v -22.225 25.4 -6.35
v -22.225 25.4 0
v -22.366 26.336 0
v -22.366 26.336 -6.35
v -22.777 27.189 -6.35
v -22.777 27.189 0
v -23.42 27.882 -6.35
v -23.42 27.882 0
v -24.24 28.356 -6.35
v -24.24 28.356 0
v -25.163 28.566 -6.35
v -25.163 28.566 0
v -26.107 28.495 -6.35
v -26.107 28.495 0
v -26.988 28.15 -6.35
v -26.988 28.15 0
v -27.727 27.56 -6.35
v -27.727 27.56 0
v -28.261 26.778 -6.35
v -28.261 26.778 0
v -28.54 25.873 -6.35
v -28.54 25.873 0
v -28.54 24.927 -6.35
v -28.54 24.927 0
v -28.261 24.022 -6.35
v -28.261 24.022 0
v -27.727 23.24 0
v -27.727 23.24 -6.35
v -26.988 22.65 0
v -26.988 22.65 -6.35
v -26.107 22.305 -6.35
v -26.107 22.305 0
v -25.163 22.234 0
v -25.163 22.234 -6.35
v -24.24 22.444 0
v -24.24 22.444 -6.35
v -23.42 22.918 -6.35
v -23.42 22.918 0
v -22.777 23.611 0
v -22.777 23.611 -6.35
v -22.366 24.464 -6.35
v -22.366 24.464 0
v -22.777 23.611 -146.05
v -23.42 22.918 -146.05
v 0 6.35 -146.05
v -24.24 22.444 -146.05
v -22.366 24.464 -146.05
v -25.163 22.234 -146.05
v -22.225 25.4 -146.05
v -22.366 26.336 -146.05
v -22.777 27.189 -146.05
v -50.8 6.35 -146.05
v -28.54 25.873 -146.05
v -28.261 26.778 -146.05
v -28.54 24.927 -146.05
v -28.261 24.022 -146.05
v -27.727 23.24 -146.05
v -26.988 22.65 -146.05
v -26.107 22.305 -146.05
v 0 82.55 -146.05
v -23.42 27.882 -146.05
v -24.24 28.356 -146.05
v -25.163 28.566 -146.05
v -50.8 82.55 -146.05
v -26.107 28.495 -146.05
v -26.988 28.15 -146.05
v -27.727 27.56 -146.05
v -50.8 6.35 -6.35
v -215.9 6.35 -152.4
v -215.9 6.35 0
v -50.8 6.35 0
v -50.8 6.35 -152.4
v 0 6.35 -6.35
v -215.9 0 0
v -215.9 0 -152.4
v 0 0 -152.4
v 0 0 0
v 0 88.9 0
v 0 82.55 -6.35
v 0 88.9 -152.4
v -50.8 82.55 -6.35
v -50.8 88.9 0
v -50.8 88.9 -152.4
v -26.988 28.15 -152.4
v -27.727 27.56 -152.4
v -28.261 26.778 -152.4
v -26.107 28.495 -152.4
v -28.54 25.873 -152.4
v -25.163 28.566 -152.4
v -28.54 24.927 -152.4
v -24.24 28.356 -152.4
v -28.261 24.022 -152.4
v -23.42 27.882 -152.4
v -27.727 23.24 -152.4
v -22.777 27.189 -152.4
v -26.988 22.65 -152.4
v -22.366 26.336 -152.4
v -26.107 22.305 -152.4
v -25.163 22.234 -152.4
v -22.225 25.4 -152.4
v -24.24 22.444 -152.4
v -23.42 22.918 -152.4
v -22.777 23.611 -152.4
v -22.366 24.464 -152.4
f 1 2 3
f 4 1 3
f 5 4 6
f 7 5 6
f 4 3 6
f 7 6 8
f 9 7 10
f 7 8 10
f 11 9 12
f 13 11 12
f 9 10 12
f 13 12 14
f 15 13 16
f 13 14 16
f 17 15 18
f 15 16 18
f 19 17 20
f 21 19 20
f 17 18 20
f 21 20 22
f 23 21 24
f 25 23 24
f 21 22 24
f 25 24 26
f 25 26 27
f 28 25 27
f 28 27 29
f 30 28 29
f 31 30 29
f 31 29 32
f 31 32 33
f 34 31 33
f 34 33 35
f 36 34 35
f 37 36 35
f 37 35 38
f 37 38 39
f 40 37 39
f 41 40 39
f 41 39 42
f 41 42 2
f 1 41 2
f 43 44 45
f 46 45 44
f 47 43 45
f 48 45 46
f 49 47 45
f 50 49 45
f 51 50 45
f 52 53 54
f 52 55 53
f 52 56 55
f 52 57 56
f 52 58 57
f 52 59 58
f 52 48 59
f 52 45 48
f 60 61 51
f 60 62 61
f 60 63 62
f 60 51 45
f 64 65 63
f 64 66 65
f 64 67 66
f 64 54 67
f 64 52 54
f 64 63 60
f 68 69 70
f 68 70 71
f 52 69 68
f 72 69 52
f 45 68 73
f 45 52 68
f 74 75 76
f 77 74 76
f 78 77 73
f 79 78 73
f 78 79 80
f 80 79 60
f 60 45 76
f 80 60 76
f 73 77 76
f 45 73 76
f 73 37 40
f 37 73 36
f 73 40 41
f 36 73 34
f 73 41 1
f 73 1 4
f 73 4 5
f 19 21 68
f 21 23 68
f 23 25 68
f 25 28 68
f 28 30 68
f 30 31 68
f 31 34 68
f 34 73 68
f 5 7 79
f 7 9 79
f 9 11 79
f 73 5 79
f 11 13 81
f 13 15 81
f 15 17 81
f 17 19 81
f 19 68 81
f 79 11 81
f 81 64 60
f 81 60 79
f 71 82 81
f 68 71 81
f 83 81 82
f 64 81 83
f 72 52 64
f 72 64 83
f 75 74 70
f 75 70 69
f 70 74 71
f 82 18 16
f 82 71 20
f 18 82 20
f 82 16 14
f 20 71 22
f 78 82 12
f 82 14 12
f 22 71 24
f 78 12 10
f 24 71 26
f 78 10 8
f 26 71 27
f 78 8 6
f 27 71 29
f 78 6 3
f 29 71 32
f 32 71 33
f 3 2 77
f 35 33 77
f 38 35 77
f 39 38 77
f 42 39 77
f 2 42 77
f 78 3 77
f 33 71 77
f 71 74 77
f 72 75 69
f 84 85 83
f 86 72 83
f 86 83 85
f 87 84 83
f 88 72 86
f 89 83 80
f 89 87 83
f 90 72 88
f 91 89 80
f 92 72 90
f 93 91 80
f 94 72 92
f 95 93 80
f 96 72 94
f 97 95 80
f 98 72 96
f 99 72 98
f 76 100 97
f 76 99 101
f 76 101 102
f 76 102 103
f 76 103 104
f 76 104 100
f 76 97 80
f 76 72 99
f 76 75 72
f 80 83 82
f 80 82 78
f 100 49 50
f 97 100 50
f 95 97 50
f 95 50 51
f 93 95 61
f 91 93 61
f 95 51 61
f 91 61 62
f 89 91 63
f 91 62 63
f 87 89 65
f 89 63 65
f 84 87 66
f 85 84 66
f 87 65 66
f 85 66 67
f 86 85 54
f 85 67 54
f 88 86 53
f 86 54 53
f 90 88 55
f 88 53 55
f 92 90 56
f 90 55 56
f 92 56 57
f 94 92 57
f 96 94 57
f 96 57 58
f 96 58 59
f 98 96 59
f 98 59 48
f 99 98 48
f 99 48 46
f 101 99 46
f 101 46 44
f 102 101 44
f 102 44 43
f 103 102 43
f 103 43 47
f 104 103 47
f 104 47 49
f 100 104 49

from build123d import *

# Parameters (mm, degrees)
SKETCH1_W                   = 165.1
SKETCH1_H                   = 152.4
BOSS_EXTRUDE1_DEPTH         = 6.35
SKETCH1_7_W                 = 50.8
SKETCH1_7_H                 = 152.4
BOSS_EXTRUDE2_DEPTH         = 88.9
SKETCH29_W                  = 139.7
SKETCH29_H                  = 76.2
CUT_EXTRUDE4_DEPTH          = 242.633979399
F_1_4_0_25_DIAMETER_HOLE2_D = 6.35


with BuildPart() as part:
    # Sketch1 → Boss-Extrude1 (new body)
    with BuildSketch(Plane(origin=(0, 0, 0), x_dir=(1, 0, 0), z_dir=(0, 1, 0))):
        with Locations((-133.35, 76.2)):
            Rectangle(SKETCH1_W, SKETCH1_H)
    extrude(amount=BOSS_EXTRUDE1_DEPTH)

    # Sketch1<7> → Boss-Extrude2 (add)
    with BuildSketch(Plane(origin=(0, 0, 0), x_dir=(1, 0, 0), z_dir=(0, 1, 0))):
        with Locations((-25.4, 76.2)):
            Rectangle(SKETCH1_7_W, SKETCH1_7_H)
    extrude(amount=BOSS_EXTRUDE2_DEPTH)

    # Sketch29 → Cut-Extrude4 (cut, through all)
    with BuildSketch(Plane.ZY.offset(50.8)):
        with Locations((-76.2, 44.45)):
            Rectangle(SKETCH29_W, SKETCH29_H)
    extrude(amount=-CUT_EXTRUDE4_DEPTH, mode=Mode.SUBTRACT)

    # 1/4 (0.25) Diameter Hole2 (through all)
    with Locations(Plane(origin=(0, 0, -152.4), x_dir=(-1, 0, 0), z_dir=(0, 0, -1))):
        with Locations((25.4, 25.4)):
            Hole(F_1_4_0_25_DIAMETER_HOLE2_D / 2)


solid = part.part
